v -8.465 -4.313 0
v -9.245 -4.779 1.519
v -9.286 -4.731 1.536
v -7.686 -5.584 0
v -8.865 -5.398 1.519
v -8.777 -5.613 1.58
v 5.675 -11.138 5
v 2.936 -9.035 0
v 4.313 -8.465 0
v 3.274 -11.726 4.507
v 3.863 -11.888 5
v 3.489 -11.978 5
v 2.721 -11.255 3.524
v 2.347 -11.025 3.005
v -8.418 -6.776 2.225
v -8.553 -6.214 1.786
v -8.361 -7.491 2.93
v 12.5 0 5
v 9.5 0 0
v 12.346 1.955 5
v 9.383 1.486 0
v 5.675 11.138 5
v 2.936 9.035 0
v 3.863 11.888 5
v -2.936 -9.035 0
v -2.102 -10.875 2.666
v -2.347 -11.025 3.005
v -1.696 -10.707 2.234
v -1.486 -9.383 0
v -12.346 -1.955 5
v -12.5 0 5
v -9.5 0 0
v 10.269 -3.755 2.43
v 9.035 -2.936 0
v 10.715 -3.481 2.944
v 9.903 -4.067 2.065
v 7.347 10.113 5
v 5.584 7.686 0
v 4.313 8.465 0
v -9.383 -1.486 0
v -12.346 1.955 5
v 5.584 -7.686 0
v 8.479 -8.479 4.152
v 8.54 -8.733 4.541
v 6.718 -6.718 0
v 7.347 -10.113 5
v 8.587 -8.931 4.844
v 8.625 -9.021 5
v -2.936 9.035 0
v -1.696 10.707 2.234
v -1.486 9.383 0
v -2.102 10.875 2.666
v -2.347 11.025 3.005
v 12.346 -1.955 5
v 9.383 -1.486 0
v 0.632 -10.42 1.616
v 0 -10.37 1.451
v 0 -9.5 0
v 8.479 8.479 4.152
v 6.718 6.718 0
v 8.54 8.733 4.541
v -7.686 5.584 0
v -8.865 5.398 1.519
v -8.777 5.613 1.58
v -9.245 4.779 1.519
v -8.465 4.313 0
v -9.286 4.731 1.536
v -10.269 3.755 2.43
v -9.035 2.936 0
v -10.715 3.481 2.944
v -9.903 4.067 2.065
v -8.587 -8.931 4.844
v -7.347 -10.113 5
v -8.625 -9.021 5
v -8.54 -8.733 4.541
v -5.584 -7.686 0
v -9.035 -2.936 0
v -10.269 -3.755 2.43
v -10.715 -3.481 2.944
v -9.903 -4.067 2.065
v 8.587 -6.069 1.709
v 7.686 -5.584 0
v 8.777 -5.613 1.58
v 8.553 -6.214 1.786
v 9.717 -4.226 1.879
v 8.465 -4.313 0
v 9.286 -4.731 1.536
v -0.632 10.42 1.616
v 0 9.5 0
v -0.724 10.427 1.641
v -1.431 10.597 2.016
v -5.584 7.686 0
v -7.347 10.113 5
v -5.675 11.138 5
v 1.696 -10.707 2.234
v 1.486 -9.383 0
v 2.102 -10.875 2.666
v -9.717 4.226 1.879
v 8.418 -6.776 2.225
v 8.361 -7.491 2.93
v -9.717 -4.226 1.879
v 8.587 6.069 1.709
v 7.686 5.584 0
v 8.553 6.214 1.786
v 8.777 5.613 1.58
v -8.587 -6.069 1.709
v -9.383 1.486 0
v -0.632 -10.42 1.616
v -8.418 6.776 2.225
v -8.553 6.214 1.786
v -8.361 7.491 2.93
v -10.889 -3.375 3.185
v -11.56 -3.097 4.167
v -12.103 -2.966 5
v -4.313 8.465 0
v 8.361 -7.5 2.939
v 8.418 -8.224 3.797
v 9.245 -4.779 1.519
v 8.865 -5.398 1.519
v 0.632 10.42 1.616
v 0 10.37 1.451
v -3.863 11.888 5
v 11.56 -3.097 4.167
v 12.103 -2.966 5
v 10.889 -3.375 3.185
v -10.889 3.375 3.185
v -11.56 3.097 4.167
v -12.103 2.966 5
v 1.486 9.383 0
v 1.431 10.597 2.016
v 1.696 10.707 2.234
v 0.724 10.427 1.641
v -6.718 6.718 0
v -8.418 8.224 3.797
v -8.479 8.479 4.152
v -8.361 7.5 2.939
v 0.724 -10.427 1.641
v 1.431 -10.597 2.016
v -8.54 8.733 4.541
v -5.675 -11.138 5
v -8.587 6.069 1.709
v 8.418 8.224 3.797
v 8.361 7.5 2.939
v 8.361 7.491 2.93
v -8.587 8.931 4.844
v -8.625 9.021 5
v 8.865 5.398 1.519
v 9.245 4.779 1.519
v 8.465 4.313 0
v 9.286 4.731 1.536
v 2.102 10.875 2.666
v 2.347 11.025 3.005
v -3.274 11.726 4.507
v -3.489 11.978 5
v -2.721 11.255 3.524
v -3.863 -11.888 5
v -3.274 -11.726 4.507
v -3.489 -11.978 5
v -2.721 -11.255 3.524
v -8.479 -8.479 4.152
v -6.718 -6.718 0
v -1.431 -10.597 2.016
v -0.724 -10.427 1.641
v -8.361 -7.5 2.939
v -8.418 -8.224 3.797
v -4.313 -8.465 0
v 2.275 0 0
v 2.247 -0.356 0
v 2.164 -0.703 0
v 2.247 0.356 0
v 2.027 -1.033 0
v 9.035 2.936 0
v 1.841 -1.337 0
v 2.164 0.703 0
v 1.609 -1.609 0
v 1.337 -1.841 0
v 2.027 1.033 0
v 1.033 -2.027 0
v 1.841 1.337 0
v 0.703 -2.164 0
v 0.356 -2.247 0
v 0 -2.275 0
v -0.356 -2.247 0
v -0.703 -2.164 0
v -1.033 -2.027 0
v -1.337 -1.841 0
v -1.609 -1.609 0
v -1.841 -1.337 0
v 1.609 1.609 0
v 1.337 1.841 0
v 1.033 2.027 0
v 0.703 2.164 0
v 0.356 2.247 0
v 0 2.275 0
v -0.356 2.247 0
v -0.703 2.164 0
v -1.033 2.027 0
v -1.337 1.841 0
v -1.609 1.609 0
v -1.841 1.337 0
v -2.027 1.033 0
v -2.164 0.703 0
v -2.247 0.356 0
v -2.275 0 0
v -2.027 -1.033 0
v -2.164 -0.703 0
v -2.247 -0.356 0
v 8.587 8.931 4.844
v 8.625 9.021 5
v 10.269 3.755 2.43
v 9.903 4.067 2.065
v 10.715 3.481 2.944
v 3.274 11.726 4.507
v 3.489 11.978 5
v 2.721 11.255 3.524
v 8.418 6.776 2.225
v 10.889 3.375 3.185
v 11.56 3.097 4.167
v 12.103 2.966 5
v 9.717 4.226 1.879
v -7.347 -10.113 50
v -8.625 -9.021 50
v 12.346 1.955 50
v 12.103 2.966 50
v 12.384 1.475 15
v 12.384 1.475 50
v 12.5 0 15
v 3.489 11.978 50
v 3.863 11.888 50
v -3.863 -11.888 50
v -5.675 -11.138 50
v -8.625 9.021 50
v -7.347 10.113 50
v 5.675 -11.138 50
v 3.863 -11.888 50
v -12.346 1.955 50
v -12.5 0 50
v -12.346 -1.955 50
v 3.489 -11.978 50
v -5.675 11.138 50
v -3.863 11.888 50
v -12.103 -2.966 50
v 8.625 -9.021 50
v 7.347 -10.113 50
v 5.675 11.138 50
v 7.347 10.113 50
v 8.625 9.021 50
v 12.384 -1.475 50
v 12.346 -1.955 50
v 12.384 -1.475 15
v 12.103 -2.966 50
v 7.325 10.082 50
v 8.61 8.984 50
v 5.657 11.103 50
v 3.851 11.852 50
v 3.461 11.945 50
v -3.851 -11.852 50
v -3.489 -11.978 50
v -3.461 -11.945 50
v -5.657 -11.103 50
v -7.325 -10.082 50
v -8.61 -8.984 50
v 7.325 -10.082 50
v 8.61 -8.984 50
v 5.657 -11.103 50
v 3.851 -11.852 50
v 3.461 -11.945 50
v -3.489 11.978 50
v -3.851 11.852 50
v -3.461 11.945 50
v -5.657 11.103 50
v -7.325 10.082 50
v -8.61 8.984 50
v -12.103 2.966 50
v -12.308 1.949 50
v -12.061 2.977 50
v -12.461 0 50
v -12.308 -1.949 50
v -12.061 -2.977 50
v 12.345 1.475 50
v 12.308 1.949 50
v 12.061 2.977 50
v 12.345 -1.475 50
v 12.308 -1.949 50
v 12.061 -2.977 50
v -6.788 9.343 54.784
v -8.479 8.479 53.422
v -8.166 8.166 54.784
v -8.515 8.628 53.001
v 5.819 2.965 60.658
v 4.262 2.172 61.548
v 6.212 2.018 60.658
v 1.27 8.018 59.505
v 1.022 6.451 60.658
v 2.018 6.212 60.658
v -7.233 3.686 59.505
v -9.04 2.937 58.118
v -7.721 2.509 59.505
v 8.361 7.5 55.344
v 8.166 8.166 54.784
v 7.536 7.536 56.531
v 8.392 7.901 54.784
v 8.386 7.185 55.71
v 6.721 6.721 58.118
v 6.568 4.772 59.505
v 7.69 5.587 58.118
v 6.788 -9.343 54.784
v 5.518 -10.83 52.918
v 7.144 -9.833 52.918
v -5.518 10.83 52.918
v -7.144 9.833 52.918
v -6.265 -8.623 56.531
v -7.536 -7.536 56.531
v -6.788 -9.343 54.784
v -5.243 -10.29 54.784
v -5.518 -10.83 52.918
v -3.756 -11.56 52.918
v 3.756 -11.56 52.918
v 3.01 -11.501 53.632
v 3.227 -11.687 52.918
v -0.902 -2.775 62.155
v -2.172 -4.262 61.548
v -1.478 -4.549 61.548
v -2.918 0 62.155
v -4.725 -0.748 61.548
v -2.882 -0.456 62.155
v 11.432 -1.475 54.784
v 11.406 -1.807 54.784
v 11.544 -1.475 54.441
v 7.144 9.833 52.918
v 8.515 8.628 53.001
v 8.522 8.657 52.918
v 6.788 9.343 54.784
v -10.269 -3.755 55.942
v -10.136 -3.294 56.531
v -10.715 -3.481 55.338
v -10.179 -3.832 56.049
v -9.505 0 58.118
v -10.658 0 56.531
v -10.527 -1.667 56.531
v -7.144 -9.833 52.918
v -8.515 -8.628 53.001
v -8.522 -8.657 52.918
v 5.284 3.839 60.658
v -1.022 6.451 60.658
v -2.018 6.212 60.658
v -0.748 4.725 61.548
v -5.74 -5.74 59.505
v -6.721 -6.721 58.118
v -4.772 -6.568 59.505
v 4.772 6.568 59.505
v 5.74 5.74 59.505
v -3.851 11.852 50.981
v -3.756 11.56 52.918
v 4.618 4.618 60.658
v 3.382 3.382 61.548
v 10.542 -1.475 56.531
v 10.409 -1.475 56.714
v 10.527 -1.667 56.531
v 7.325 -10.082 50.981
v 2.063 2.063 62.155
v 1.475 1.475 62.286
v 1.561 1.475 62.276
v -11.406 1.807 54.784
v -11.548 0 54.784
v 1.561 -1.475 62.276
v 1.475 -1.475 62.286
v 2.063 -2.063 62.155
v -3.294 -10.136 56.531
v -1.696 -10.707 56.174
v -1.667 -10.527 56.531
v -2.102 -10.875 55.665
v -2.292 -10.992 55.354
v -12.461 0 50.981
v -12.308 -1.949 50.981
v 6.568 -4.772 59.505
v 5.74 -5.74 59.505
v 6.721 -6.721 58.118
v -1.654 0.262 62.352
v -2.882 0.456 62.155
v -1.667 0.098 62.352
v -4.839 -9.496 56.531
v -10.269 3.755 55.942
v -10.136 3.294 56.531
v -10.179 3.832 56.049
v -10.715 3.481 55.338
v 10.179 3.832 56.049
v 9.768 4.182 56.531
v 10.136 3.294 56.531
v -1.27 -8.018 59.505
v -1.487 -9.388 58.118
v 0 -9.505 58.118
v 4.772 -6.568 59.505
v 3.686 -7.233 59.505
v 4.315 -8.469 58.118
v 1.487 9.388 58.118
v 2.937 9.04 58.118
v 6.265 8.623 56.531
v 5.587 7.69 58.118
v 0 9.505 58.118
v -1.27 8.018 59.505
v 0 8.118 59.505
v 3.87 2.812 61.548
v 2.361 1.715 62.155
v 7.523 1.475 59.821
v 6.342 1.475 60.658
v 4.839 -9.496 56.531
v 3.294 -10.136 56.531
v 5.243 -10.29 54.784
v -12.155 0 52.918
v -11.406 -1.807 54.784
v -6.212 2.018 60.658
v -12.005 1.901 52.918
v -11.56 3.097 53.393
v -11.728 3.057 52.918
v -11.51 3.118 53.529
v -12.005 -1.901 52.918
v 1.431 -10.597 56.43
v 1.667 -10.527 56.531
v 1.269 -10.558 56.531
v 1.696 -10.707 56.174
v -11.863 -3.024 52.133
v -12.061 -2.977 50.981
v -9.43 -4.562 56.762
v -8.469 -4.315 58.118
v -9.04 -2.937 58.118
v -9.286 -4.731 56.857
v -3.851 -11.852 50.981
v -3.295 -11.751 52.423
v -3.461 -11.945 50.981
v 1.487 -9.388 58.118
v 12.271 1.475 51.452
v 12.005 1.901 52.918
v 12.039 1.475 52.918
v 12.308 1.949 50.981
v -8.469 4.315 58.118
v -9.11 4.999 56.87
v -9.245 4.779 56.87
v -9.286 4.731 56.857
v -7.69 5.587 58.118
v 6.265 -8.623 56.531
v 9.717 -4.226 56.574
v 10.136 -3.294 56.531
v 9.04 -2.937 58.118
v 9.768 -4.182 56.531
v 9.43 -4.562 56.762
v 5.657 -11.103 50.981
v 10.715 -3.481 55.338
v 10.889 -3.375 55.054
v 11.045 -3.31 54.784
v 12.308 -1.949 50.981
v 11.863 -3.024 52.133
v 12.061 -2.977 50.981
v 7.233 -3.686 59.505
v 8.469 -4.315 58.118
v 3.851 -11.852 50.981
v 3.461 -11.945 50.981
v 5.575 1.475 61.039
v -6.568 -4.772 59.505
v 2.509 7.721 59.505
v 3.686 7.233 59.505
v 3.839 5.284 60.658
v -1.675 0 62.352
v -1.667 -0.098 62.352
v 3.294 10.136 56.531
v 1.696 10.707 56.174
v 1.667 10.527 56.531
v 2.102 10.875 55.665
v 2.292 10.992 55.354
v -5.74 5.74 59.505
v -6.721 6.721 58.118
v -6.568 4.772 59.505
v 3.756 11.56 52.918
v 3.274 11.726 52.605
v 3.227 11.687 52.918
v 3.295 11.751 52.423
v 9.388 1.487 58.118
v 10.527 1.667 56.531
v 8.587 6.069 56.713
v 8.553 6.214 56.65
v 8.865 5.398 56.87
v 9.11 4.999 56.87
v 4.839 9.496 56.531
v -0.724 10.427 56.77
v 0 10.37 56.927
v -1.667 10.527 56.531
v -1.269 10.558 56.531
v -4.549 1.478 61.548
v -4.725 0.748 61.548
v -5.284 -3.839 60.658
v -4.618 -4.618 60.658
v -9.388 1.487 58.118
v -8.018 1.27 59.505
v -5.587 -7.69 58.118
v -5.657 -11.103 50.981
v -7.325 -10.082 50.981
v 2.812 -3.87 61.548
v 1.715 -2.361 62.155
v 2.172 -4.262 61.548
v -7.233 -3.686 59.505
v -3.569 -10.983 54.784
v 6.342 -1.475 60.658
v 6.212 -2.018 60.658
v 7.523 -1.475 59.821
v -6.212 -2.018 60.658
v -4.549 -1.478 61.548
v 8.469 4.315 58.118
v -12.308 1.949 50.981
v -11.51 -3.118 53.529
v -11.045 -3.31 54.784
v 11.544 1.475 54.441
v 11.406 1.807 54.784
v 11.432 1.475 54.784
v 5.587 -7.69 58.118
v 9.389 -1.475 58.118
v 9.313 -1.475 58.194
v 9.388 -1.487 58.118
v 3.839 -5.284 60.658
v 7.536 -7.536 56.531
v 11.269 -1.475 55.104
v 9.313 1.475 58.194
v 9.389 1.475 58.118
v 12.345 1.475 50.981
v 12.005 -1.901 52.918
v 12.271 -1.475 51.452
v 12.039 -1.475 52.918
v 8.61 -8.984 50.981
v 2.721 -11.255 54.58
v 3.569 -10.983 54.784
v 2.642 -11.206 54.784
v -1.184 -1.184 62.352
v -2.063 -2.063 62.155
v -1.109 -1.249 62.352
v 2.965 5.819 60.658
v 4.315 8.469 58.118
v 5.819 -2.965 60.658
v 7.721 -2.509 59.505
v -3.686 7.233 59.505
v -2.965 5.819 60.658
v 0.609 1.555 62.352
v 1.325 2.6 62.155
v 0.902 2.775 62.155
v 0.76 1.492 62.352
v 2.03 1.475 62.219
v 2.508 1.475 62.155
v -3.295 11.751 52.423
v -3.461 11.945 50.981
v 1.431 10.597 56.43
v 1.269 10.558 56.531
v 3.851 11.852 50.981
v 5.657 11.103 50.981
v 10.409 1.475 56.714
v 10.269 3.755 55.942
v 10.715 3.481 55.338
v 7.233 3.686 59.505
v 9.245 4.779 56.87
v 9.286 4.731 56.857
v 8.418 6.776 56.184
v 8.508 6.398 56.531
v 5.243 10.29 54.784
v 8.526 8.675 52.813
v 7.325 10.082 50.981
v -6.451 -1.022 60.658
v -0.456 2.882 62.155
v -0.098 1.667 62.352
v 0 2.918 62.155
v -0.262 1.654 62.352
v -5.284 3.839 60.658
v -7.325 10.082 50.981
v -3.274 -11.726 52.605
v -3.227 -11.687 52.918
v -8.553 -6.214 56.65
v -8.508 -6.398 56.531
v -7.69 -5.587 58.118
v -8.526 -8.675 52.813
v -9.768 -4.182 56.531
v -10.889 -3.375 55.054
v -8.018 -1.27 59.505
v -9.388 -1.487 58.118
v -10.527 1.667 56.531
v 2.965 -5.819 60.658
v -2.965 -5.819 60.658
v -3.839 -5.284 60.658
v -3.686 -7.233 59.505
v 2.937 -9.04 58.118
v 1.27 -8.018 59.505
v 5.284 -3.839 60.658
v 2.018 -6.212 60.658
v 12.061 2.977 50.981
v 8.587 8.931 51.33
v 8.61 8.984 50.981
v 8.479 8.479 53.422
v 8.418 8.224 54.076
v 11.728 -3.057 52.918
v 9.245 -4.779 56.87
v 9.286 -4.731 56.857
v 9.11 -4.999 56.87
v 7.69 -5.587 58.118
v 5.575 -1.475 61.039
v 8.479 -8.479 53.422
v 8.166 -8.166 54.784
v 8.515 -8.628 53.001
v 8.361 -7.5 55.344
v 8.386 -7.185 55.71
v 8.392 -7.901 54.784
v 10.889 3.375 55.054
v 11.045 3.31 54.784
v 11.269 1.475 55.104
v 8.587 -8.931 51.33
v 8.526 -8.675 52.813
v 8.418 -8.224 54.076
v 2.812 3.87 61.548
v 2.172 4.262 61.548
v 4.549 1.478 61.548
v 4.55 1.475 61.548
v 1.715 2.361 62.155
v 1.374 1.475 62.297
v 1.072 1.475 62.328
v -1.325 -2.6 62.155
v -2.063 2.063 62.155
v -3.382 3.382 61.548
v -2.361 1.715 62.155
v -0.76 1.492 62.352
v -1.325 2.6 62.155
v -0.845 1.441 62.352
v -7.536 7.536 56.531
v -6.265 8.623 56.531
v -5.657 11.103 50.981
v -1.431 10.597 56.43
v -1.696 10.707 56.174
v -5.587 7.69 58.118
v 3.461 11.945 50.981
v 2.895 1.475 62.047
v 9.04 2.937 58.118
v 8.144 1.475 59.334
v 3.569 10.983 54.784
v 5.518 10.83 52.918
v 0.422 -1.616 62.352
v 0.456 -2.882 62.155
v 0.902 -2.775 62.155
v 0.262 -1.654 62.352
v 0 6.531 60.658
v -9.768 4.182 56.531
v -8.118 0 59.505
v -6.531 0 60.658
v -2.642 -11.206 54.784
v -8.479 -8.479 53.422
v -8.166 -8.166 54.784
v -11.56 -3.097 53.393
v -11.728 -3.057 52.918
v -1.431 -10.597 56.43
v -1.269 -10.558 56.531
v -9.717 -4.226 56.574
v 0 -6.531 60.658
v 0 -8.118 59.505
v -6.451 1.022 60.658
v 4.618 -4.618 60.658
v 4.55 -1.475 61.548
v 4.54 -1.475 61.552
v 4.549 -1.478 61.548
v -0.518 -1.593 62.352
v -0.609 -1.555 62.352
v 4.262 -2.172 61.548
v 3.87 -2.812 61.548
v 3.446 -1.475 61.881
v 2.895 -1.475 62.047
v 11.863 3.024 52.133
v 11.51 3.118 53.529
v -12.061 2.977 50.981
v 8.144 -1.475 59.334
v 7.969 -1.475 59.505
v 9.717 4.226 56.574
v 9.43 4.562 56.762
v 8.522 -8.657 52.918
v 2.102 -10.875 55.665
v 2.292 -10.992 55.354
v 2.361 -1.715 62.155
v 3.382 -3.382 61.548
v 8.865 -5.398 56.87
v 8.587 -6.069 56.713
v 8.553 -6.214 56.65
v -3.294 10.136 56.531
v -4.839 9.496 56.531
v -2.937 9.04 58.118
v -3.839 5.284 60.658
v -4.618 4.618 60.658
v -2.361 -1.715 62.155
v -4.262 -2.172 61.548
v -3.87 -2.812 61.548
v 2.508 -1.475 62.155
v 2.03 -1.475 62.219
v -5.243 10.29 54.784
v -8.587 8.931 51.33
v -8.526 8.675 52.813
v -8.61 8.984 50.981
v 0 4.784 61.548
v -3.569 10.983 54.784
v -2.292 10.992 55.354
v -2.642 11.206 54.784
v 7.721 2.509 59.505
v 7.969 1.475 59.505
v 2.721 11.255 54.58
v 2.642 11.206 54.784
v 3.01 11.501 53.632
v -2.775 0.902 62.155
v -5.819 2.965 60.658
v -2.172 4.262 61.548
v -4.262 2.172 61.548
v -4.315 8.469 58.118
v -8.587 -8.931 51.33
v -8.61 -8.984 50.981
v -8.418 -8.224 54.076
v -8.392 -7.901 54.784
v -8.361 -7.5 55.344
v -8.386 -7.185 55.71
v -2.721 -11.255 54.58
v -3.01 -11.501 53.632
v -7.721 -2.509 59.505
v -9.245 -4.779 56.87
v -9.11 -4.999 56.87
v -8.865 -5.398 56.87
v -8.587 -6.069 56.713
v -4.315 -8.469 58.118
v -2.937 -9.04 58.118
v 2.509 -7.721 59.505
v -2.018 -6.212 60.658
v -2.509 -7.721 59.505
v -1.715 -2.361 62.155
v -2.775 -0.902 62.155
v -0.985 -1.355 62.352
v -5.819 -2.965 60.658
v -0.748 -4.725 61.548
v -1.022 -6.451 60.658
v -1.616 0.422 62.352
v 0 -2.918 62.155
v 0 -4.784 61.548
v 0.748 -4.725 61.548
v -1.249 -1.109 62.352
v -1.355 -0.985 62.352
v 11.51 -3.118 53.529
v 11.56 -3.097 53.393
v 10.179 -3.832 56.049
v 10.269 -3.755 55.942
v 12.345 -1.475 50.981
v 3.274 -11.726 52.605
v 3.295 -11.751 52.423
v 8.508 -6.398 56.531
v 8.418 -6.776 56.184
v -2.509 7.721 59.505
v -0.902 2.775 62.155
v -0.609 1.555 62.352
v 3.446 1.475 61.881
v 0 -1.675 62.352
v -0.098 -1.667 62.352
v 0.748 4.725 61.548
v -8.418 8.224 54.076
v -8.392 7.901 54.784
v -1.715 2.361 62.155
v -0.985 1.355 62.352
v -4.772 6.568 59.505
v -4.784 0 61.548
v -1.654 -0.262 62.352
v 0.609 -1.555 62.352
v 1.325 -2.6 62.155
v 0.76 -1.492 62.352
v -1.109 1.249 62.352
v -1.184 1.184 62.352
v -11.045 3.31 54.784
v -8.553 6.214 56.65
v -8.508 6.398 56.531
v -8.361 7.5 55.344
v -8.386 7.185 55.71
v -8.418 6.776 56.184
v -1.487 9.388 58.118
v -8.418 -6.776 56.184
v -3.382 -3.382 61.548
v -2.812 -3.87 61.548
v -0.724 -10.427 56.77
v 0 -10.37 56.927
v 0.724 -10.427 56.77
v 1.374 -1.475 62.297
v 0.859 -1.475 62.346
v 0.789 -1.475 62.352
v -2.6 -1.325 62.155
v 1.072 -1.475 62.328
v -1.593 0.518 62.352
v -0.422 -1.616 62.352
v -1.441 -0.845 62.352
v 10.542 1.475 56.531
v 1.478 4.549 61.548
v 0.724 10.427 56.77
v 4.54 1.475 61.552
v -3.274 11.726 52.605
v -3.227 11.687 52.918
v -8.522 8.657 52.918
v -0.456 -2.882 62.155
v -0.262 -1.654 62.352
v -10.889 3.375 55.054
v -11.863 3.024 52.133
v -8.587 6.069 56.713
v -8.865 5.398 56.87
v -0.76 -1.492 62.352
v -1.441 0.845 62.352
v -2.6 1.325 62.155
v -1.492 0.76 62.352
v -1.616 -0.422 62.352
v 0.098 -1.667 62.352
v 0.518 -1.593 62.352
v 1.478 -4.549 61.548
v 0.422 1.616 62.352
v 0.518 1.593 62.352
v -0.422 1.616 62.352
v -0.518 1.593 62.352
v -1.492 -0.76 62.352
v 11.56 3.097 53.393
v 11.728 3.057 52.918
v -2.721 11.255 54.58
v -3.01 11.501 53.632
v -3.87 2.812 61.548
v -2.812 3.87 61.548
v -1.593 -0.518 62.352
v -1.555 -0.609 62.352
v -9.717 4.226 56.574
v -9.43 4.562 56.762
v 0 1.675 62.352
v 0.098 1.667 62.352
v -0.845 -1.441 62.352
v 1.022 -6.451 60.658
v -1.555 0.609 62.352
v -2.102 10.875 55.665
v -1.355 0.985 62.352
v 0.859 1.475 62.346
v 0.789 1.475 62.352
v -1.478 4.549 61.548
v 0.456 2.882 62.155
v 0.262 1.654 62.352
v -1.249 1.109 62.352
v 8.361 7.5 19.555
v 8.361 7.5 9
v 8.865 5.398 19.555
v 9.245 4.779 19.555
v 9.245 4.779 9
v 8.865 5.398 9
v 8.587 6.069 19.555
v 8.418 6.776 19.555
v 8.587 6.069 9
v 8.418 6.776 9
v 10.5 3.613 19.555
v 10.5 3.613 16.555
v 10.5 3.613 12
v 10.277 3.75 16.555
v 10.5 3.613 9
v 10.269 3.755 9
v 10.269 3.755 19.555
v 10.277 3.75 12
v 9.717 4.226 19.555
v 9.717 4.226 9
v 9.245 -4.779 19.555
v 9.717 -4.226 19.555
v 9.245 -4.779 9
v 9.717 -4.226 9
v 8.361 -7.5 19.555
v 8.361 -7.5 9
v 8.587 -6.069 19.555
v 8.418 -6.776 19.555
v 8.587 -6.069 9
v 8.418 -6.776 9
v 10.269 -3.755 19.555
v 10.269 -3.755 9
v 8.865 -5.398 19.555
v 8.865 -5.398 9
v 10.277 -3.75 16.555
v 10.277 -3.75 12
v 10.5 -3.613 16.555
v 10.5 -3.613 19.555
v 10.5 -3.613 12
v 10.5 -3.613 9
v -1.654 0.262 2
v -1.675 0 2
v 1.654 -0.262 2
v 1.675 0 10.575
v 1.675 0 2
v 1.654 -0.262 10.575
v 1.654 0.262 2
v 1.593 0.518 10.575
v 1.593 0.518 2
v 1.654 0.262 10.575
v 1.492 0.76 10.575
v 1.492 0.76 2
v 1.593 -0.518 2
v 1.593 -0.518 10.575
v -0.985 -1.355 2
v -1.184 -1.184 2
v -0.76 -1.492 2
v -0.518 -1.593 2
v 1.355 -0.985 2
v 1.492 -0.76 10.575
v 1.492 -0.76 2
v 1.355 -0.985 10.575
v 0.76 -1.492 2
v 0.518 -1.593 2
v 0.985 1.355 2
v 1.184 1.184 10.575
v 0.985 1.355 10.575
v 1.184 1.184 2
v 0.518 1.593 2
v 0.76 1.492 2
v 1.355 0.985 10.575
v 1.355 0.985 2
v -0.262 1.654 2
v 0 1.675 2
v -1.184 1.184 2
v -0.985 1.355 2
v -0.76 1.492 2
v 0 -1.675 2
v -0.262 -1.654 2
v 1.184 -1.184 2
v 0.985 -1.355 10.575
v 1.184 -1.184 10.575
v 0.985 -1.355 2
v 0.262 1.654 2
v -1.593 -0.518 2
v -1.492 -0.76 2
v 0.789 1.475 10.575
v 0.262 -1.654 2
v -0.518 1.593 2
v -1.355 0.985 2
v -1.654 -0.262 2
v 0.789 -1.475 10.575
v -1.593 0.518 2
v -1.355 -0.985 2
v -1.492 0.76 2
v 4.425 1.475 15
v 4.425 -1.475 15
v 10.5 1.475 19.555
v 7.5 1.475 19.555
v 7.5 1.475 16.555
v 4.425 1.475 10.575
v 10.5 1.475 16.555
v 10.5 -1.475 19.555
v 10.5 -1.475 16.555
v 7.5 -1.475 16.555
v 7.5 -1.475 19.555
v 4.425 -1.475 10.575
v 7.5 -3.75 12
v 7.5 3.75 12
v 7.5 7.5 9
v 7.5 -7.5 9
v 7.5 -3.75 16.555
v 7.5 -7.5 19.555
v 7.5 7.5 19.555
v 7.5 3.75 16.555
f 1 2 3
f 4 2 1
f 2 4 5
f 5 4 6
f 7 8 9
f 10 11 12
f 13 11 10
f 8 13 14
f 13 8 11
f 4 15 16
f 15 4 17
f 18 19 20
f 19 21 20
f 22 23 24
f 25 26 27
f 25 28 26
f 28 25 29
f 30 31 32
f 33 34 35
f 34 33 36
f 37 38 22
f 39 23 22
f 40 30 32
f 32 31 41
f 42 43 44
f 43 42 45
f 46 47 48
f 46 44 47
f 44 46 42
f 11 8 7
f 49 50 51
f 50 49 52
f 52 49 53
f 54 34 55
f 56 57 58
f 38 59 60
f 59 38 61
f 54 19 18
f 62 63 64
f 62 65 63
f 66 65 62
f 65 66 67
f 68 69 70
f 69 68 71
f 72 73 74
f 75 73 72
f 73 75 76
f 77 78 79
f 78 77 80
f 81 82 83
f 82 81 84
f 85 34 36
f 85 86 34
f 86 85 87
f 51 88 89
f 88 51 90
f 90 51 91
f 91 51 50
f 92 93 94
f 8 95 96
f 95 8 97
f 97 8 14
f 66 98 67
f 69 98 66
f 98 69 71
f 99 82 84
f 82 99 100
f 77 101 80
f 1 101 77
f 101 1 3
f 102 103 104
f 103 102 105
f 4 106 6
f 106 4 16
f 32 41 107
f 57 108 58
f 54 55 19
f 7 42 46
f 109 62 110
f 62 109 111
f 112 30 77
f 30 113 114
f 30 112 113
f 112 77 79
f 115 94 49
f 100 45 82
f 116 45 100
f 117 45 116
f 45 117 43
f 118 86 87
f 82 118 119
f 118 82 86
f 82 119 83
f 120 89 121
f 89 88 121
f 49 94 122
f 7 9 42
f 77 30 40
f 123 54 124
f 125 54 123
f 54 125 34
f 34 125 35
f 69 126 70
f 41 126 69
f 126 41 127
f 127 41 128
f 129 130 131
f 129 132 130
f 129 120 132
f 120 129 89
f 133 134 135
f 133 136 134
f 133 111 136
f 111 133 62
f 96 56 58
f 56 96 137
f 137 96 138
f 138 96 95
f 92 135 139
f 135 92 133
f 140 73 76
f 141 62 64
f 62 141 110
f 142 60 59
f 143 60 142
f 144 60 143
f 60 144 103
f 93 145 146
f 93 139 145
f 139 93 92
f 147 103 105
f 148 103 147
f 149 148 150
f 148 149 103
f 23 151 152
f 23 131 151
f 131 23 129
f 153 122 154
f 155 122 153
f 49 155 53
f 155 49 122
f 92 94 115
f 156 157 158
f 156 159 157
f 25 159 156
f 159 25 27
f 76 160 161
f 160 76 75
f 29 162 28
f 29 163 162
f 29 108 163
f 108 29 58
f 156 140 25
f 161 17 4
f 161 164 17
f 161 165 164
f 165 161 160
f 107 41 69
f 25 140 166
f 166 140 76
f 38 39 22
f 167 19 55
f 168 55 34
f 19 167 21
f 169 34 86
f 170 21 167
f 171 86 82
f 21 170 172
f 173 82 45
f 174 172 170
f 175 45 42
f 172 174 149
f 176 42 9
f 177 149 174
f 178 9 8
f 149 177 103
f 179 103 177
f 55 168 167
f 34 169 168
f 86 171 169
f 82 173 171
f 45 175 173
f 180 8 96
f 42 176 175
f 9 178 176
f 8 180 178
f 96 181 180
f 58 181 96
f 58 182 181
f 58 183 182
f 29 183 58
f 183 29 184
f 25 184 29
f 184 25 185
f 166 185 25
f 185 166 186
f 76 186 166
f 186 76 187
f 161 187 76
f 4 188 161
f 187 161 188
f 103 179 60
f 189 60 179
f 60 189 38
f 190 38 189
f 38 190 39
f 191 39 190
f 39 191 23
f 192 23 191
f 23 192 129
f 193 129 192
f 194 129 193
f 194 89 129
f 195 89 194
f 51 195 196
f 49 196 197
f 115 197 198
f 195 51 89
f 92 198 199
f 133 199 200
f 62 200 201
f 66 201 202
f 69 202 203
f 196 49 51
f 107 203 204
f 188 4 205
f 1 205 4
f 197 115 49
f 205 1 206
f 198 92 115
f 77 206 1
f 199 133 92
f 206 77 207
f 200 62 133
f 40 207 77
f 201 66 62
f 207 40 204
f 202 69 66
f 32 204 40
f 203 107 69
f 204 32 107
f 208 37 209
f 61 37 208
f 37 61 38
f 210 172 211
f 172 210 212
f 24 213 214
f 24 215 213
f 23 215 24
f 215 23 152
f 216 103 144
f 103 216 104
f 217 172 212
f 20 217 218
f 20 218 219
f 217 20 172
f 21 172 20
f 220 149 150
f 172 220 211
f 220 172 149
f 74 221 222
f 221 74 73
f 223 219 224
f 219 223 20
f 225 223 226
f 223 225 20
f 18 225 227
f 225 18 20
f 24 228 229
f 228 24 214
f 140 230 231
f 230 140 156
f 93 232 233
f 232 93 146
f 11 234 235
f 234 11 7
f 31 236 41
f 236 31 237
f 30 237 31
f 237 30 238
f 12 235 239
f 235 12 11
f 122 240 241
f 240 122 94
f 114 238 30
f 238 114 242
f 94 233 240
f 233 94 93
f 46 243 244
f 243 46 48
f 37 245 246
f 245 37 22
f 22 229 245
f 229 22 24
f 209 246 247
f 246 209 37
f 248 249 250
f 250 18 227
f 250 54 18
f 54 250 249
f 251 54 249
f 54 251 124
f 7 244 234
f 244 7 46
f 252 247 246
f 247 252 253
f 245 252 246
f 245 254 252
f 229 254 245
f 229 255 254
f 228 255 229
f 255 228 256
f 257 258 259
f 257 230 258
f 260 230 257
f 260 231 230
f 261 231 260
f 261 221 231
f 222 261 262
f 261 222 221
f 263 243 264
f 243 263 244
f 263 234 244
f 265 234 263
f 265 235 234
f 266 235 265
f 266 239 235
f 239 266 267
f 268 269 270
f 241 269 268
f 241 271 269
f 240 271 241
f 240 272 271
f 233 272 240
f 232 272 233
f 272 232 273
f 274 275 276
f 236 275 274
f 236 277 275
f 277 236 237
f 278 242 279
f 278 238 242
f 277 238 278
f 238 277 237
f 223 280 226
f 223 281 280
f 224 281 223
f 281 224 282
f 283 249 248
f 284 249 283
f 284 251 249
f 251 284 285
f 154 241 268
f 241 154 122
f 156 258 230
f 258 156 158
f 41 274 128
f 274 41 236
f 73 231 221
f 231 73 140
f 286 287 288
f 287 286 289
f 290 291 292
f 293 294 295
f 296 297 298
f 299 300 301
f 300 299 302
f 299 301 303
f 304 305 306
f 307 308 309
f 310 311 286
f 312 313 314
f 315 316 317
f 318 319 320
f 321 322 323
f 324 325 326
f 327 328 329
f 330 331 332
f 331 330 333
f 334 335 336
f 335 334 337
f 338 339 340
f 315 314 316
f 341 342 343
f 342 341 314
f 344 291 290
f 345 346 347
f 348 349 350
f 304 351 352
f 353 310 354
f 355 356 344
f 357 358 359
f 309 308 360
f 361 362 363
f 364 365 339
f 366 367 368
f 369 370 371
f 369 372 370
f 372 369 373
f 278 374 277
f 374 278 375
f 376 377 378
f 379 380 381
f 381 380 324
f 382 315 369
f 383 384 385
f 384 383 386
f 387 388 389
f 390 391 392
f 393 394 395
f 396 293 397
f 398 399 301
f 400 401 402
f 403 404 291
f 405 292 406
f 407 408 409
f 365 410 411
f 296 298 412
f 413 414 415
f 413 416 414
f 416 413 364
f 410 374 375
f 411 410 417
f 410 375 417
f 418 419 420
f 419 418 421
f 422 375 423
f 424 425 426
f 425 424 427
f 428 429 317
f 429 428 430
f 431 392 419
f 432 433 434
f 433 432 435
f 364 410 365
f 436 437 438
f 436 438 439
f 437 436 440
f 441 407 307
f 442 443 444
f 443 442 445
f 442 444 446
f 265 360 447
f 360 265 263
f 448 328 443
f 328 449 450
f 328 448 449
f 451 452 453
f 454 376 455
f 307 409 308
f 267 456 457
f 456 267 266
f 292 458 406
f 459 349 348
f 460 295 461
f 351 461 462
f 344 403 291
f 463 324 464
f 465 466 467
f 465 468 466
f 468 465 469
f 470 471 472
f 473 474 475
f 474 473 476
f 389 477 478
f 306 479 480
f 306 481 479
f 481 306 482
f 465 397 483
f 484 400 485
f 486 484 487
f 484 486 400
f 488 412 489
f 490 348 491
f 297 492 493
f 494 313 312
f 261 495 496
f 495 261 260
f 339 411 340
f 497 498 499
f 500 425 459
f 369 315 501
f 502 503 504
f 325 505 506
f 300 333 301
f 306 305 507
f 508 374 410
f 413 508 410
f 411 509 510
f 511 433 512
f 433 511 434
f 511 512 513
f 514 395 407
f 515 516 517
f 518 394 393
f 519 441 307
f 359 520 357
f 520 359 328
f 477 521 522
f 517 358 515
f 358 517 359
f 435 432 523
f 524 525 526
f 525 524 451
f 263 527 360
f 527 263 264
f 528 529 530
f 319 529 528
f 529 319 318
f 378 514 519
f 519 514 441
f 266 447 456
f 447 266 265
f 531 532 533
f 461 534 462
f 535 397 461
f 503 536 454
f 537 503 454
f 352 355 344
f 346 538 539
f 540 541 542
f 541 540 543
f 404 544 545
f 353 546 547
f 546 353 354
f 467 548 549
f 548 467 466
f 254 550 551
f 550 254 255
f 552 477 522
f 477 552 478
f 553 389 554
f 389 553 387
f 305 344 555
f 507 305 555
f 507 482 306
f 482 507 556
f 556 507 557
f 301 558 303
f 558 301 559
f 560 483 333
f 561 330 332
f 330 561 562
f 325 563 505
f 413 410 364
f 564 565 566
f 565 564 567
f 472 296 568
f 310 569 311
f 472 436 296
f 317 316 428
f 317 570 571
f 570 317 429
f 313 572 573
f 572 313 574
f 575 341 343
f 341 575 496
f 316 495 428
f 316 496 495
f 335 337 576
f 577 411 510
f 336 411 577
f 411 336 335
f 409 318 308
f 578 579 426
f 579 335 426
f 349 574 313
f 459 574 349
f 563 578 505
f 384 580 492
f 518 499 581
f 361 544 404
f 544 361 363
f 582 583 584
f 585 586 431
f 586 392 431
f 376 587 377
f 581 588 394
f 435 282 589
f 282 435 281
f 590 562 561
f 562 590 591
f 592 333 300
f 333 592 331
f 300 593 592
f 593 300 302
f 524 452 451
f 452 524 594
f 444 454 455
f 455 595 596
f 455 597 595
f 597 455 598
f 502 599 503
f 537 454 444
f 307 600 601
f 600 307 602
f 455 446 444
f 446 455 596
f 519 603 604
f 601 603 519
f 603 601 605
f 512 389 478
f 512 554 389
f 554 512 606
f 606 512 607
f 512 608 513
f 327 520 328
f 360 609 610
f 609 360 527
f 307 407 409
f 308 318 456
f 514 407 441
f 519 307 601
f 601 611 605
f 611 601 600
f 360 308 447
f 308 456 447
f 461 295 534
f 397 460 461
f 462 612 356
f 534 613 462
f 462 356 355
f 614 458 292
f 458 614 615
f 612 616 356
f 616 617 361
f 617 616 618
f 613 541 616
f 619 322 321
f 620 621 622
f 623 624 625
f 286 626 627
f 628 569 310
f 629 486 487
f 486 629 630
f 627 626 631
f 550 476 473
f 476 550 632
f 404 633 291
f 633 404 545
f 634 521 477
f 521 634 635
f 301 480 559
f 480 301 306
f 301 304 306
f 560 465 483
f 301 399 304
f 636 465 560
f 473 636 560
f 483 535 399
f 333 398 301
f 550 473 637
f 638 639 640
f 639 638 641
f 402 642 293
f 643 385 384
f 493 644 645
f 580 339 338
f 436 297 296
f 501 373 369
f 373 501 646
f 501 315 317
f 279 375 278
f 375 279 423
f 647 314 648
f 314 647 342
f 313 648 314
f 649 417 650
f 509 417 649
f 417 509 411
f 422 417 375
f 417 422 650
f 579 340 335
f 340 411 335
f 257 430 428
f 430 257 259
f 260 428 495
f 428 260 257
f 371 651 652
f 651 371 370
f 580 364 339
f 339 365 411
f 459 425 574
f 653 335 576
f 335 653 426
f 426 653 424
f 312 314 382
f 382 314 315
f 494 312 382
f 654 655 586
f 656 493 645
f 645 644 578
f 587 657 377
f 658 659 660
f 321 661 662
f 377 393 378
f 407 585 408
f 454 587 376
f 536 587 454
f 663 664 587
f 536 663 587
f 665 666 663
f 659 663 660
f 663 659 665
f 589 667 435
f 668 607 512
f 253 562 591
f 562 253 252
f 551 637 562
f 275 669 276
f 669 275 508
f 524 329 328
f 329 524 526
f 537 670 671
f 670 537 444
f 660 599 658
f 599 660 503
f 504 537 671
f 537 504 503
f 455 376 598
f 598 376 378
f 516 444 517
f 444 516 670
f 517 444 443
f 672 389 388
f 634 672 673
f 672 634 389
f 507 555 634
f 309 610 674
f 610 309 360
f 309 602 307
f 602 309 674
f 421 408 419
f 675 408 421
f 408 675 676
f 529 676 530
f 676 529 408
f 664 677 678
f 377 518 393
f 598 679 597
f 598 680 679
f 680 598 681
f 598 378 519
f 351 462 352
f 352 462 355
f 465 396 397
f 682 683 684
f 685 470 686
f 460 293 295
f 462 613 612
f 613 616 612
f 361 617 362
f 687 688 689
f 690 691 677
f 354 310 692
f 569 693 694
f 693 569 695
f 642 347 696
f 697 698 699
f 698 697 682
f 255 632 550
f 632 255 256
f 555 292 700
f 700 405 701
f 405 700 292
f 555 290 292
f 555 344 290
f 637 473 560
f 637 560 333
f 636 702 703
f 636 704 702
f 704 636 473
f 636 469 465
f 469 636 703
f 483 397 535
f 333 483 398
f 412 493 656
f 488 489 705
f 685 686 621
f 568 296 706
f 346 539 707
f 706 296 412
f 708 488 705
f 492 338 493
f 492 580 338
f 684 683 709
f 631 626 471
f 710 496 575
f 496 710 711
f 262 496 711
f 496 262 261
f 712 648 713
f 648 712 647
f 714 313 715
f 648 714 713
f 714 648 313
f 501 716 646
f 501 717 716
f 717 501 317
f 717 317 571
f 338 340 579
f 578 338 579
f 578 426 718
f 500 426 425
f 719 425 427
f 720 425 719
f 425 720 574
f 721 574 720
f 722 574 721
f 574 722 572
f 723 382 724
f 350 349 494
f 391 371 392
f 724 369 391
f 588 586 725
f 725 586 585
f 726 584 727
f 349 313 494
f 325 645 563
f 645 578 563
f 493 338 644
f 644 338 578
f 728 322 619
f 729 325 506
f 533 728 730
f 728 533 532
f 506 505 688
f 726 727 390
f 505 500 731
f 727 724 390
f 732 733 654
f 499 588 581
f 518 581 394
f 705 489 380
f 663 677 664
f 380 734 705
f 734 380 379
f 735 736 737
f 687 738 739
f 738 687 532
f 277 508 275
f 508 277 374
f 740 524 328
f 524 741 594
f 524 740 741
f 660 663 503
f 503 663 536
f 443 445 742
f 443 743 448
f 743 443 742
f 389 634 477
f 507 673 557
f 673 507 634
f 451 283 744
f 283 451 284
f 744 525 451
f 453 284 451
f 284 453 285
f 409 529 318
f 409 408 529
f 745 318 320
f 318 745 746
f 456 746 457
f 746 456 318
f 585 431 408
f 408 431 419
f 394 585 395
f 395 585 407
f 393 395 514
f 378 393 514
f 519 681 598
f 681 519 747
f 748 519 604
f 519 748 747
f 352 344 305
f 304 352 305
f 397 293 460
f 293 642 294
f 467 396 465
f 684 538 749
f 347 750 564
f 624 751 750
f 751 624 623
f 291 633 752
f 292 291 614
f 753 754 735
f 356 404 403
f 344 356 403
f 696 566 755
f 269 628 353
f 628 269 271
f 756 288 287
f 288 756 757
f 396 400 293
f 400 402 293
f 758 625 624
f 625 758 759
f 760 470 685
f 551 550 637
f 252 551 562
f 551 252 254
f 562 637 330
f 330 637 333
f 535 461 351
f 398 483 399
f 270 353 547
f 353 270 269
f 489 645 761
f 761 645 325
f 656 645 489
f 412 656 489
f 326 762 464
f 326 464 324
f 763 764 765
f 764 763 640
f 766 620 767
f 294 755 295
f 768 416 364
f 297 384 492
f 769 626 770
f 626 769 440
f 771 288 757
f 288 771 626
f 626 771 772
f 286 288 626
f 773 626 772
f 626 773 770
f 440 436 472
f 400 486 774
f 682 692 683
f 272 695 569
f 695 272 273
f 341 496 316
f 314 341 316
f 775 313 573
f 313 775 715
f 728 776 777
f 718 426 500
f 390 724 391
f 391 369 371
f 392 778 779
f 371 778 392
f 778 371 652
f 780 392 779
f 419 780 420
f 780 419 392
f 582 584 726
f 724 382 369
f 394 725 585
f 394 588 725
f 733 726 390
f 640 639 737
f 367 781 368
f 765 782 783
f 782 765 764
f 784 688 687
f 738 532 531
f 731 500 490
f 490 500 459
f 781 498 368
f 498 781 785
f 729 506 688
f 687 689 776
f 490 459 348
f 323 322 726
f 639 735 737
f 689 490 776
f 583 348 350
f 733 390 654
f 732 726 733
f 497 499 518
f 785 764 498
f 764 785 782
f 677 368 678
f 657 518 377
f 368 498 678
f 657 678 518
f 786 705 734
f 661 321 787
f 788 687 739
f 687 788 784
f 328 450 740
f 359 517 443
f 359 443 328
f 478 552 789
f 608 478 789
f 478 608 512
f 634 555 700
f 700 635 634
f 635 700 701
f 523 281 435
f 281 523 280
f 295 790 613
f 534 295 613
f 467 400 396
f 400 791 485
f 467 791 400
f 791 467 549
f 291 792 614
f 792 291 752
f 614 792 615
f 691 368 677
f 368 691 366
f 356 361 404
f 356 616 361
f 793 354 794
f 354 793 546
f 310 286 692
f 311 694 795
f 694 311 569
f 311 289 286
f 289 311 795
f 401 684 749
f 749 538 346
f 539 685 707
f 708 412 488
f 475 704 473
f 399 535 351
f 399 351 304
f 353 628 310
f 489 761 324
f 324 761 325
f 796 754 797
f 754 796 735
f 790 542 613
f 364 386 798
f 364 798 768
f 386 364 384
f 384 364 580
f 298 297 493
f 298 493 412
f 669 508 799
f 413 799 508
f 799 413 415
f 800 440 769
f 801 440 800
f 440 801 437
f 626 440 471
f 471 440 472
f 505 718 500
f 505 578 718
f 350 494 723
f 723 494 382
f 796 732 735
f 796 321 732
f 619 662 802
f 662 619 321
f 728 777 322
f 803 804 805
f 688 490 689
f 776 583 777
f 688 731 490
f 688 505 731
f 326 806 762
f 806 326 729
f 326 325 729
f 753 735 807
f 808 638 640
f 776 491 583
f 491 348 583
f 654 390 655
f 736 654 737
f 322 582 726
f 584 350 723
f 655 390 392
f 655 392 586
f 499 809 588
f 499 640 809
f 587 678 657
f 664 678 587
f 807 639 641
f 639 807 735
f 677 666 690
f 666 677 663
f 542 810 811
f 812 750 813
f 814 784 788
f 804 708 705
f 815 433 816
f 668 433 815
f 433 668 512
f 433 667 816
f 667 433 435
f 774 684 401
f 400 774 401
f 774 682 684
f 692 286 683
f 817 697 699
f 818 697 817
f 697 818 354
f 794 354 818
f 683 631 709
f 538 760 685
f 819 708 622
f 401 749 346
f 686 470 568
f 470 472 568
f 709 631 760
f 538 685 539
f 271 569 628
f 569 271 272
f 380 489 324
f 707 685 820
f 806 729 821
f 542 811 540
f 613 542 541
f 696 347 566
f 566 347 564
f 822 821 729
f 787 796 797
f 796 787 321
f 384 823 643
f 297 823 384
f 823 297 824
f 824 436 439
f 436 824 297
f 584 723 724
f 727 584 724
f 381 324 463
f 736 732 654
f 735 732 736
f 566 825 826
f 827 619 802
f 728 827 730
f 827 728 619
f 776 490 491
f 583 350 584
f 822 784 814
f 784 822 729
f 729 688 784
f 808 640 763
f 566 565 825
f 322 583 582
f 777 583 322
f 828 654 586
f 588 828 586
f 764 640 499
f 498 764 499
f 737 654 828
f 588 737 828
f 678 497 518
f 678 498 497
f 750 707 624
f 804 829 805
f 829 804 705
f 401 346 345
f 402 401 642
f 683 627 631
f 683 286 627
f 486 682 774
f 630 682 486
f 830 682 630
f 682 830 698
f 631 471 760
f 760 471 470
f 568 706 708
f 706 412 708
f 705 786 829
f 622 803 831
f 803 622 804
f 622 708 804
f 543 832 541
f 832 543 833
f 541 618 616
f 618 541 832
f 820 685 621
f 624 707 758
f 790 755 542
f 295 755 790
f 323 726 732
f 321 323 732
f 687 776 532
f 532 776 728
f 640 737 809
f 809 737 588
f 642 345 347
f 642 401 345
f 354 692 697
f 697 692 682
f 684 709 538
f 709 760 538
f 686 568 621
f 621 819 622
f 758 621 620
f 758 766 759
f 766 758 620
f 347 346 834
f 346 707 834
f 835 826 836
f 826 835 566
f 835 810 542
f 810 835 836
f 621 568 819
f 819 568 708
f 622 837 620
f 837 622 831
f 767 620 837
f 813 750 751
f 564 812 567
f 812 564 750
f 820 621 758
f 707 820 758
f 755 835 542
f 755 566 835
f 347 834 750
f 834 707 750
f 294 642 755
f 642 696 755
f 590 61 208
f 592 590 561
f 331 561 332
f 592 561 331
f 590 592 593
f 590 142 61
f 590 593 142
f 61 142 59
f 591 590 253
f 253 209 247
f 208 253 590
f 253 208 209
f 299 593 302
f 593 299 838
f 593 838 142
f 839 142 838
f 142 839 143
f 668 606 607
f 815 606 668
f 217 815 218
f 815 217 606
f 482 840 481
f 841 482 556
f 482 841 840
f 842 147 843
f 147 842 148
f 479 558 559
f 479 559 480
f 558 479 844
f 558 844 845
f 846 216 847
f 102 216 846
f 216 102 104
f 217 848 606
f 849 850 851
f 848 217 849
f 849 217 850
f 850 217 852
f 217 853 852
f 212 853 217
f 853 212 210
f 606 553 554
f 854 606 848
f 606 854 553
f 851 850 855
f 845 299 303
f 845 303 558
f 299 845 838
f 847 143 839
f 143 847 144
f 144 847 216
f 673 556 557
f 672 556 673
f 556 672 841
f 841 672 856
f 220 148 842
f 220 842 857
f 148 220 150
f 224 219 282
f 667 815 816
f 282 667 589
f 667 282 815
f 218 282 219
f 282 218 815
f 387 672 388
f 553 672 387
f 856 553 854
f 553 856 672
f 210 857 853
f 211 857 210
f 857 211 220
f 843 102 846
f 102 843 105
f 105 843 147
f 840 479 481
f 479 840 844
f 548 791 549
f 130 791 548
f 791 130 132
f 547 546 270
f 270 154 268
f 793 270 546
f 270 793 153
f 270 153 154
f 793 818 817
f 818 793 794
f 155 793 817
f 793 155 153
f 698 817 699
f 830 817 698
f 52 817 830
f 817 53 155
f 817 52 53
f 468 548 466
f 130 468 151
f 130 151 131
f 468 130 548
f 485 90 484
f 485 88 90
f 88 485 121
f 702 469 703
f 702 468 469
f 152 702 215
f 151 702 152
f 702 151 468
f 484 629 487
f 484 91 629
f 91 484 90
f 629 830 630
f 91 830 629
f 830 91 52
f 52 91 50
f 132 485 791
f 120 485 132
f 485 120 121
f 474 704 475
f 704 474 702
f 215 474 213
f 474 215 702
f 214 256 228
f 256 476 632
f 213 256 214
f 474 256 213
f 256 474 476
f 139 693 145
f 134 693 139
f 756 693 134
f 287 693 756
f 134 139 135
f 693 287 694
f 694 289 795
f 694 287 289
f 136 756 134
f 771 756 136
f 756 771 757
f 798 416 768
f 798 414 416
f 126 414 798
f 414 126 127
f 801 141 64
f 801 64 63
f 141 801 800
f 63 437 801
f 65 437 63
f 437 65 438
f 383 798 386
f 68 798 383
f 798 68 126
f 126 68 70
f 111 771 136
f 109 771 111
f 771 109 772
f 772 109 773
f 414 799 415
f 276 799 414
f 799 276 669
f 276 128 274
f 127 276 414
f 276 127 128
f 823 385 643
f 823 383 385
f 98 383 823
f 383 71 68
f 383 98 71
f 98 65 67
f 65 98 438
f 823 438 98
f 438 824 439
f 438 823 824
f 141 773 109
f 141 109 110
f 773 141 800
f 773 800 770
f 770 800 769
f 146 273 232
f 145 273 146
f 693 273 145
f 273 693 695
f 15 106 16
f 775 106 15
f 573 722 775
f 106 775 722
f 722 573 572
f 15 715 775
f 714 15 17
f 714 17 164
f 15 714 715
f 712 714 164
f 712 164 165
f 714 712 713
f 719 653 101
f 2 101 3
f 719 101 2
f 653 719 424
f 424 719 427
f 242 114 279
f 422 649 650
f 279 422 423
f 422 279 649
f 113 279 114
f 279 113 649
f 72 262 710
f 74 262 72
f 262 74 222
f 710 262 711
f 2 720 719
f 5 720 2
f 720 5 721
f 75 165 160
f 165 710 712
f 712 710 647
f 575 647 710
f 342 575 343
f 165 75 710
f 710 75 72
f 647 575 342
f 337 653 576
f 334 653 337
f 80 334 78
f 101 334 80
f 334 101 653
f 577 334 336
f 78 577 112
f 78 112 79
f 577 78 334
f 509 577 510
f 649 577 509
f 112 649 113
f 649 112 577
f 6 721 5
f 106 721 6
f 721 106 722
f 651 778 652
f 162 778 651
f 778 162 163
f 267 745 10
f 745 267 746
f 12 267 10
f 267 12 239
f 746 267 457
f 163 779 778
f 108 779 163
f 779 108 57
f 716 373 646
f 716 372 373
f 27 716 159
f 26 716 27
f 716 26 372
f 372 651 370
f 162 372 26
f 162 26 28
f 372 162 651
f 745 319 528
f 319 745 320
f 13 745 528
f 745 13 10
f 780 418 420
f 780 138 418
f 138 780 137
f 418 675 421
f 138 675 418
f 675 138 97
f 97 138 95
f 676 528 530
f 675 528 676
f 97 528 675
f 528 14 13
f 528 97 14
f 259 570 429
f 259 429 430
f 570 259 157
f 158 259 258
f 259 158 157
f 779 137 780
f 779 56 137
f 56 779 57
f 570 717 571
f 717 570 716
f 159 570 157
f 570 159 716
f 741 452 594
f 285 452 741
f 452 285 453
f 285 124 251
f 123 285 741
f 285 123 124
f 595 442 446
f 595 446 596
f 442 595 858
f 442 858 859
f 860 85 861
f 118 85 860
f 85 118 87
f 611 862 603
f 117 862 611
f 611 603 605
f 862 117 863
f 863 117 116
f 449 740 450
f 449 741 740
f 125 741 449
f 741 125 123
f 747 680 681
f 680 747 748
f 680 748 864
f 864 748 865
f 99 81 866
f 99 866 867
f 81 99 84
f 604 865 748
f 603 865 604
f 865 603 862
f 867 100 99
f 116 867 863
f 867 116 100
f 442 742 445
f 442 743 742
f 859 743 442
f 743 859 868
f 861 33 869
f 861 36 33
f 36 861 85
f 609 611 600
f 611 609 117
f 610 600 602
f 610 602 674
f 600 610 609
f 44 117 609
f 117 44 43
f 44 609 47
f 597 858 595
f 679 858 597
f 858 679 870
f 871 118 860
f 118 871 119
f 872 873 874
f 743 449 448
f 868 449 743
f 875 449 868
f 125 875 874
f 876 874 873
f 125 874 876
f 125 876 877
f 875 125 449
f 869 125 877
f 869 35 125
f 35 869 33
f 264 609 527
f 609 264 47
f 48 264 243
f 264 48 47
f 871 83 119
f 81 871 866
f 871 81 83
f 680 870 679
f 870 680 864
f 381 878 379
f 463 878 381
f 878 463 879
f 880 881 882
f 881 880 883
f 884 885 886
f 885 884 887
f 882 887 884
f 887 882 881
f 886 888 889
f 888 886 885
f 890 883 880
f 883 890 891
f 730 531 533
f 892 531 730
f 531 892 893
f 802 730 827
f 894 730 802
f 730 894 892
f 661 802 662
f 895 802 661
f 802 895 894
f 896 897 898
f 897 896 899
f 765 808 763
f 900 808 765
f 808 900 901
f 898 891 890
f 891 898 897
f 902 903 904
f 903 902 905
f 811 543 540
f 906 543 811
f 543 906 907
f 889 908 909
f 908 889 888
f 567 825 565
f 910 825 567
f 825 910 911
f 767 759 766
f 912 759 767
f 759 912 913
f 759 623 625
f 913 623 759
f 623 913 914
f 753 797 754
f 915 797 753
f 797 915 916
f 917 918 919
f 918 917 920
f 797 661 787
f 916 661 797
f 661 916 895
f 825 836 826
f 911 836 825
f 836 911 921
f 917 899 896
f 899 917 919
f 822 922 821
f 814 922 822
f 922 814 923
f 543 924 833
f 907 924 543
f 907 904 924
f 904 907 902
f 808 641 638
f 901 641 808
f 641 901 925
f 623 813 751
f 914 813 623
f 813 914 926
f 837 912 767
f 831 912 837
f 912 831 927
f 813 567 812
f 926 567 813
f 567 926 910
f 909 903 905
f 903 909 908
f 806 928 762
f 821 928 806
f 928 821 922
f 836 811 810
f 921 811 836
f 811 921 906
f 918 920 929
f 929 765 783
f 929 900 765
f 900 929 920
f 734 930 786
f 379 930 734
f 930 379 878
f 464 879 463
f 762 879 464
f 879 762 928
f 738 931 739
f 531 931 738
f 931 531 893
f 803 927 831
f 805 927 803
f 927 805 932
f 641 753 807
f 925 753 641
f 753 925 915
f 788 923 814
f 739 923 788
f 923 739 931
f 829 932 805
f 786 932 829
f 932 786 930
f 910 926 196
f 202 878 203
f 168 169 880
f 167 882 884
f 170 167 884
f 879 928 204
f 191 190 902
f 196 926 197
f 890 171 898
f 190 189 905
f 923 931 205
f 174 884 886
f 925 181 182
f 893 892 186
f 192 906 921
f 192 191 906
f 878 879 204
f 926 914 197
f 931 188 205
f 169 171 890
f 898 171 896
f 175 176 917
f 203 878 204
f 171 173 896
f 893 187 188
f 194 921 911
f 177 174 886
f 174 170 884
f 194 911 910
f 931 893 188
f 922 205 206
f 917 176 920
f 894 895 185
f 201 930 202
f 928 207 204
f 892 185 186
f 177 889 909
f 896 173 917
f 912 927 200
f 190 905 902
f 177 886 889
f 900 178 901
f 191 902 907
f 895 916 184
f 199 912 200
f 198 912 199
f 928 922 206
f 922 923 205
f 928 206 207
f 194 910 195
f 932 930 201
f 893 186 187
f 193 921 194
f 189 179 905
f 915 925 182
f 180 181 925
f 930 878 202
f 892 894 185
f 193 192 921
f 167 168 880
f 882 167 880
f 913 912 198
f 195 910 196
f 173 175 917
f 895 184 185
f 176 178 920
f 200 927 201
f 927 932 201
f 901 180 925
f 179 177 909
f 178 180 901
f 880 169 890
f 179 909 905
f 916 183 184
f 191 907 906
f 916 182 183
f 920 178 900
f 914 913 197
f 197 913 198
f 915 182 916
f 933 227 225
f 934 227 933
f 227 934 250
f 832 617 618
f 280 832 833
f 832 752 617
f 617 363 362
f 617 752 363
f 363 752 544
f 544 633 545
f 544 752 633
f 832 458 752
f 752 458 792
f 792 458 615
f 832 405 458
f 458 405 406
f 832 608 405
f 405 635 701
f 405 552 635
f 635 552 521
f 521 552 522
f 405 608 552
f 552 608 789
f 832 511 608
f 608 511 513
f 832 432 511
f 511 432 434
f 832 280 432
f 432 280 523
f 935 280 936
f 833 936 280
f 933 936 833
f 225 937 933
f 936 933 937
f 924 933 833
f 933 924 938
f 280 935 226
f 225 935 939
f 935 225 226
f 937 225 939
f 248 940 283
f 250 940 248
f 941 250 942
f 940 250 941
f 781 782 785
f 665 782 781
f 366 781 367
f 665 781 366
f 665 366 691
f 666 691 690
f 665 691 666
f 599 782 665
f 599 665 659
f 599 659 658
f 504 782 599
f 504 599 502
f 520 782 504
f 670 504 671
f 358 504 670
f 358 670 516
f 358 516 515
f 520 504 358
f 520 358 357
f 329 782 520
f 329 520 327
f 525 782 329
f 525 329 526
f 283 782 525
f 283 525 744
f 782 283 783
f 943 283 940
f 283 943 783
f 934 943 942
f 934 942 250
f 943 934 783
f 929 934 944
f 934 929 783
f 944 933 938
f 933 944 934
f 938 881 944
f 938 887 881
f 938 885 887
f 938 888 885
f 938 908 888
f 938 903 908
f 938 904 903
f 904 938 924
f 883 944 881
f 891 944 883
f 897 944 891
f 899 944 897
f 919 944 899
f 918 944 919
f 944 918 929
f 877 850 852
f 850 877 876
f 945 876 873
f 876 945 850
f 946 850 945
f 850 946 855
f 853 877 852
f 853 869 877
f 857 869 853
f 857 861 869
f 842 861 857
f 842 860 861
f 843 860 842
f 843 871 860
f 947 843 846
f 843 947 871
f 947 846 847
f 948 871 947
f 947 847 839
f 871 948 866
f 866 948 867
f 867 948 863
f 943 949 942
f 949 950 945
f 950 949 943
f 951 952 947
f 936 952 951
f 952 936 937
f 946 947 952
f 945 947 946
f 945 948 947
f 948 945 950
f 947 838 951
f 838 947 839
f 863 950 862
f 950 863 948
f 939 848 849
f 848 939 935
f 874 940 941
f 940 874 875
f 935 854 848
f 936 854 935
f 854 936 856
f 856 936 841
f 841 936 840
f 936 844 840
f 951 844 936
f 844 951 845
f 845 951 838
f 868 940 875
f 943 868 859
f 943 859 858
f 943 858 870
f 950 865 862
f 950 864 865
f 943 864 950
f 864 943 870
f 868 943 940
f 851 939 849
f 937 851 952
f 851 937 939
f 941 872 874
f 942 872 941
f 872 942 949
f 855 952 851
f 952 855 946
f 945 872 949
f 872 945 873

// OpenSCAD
// Diameter of hole for the hex wrench
hex_size = 2.8;

// Increase slot size by this amount
hole_delta = 0.15;

// Diameter of the handle
handle_diameter = 25;

handle(hex_size);

module handle(hex_size)
{
	hex_radius = (hex_size + hole_delta) / 2;
	hex_size = hex_size + hole_delta;
	handle_radius = handle_diameter / 2;
	knurl_offset = handle_radius * 1.2;
	handle_height = 50;
	slot_width = 1.2 * handle_radius;
	zip_tie_back = 0.6 * handle_radius;
	slot_bottom = 15;

	$fn=40;									// Control quality of mesh

	hole_radius = hex_radius + .2;	// Give a little more room for small hole

	difference()
	{
		union()
		{
			cylinder(h = 5, r1 = handle_radius - 3, r2 = handle_radius);
			translate(v=[0, 0, 5])
				cylinder(h = handle_height - 5, r = handle_radius);
			translate(v=[0, 0, handle_height])
				sphere(handle_radius);
		}

		for (angle = [30:60:360])
			translate(v=[knurl_offset * cos(angle), knurl_offset * sin(angle), 0])
				cylinder(h = handle_height + handle_radius, r = handle_radius / 2.7);

		// Shaft hole
		cylinder(h = handle_height + handle_radius, r = hole_radius);

		// Small cone at bottom
		cylinder(h = 2, r1 = hole_radius + .6, r2 = hole_radius);

		// Slot for the wrench
		translate(v=[0, -hex_size / 2, slot_bottom])
			cube(size = [handle_radius, hex_size, handle_height + handle_radius]);

		// Slot for bend in wrench
		translate(v=[0, -hex_size / 2, slot_bottom - 1.5 * hex_size])
			cube(size = [1.5 * hex_size, hex_size, 2 * hex_size]);

		// Lower slot for zip-tie
		translate(v=[zip_tie_back, -slot_width / 2, slot_bottom - 6])
			cube(size=[3, slot_width, 3]);

		// Upper slot for zip tie
		translate(v=[zip_tie_back, -slot_width / 2, slot_bottom + sin(60) * hex_size - 1])
			cube(size=[3, slot_width, 3]);

		// Zip Tie Opening
		translate(v=[zip_tie_back, slot_width / 4, slot_bottom - 6])
			cube(size=[3, slot_width / 4, 6 + sin(60) * hex_size + 2]);

		translate(v=[zip_tie_back, -slot_width / 2, slot_bottom - 6])
			cube(size=[3, slot_width / 4, 6 + sin(60) * hex_size + 2]);
	}
}

